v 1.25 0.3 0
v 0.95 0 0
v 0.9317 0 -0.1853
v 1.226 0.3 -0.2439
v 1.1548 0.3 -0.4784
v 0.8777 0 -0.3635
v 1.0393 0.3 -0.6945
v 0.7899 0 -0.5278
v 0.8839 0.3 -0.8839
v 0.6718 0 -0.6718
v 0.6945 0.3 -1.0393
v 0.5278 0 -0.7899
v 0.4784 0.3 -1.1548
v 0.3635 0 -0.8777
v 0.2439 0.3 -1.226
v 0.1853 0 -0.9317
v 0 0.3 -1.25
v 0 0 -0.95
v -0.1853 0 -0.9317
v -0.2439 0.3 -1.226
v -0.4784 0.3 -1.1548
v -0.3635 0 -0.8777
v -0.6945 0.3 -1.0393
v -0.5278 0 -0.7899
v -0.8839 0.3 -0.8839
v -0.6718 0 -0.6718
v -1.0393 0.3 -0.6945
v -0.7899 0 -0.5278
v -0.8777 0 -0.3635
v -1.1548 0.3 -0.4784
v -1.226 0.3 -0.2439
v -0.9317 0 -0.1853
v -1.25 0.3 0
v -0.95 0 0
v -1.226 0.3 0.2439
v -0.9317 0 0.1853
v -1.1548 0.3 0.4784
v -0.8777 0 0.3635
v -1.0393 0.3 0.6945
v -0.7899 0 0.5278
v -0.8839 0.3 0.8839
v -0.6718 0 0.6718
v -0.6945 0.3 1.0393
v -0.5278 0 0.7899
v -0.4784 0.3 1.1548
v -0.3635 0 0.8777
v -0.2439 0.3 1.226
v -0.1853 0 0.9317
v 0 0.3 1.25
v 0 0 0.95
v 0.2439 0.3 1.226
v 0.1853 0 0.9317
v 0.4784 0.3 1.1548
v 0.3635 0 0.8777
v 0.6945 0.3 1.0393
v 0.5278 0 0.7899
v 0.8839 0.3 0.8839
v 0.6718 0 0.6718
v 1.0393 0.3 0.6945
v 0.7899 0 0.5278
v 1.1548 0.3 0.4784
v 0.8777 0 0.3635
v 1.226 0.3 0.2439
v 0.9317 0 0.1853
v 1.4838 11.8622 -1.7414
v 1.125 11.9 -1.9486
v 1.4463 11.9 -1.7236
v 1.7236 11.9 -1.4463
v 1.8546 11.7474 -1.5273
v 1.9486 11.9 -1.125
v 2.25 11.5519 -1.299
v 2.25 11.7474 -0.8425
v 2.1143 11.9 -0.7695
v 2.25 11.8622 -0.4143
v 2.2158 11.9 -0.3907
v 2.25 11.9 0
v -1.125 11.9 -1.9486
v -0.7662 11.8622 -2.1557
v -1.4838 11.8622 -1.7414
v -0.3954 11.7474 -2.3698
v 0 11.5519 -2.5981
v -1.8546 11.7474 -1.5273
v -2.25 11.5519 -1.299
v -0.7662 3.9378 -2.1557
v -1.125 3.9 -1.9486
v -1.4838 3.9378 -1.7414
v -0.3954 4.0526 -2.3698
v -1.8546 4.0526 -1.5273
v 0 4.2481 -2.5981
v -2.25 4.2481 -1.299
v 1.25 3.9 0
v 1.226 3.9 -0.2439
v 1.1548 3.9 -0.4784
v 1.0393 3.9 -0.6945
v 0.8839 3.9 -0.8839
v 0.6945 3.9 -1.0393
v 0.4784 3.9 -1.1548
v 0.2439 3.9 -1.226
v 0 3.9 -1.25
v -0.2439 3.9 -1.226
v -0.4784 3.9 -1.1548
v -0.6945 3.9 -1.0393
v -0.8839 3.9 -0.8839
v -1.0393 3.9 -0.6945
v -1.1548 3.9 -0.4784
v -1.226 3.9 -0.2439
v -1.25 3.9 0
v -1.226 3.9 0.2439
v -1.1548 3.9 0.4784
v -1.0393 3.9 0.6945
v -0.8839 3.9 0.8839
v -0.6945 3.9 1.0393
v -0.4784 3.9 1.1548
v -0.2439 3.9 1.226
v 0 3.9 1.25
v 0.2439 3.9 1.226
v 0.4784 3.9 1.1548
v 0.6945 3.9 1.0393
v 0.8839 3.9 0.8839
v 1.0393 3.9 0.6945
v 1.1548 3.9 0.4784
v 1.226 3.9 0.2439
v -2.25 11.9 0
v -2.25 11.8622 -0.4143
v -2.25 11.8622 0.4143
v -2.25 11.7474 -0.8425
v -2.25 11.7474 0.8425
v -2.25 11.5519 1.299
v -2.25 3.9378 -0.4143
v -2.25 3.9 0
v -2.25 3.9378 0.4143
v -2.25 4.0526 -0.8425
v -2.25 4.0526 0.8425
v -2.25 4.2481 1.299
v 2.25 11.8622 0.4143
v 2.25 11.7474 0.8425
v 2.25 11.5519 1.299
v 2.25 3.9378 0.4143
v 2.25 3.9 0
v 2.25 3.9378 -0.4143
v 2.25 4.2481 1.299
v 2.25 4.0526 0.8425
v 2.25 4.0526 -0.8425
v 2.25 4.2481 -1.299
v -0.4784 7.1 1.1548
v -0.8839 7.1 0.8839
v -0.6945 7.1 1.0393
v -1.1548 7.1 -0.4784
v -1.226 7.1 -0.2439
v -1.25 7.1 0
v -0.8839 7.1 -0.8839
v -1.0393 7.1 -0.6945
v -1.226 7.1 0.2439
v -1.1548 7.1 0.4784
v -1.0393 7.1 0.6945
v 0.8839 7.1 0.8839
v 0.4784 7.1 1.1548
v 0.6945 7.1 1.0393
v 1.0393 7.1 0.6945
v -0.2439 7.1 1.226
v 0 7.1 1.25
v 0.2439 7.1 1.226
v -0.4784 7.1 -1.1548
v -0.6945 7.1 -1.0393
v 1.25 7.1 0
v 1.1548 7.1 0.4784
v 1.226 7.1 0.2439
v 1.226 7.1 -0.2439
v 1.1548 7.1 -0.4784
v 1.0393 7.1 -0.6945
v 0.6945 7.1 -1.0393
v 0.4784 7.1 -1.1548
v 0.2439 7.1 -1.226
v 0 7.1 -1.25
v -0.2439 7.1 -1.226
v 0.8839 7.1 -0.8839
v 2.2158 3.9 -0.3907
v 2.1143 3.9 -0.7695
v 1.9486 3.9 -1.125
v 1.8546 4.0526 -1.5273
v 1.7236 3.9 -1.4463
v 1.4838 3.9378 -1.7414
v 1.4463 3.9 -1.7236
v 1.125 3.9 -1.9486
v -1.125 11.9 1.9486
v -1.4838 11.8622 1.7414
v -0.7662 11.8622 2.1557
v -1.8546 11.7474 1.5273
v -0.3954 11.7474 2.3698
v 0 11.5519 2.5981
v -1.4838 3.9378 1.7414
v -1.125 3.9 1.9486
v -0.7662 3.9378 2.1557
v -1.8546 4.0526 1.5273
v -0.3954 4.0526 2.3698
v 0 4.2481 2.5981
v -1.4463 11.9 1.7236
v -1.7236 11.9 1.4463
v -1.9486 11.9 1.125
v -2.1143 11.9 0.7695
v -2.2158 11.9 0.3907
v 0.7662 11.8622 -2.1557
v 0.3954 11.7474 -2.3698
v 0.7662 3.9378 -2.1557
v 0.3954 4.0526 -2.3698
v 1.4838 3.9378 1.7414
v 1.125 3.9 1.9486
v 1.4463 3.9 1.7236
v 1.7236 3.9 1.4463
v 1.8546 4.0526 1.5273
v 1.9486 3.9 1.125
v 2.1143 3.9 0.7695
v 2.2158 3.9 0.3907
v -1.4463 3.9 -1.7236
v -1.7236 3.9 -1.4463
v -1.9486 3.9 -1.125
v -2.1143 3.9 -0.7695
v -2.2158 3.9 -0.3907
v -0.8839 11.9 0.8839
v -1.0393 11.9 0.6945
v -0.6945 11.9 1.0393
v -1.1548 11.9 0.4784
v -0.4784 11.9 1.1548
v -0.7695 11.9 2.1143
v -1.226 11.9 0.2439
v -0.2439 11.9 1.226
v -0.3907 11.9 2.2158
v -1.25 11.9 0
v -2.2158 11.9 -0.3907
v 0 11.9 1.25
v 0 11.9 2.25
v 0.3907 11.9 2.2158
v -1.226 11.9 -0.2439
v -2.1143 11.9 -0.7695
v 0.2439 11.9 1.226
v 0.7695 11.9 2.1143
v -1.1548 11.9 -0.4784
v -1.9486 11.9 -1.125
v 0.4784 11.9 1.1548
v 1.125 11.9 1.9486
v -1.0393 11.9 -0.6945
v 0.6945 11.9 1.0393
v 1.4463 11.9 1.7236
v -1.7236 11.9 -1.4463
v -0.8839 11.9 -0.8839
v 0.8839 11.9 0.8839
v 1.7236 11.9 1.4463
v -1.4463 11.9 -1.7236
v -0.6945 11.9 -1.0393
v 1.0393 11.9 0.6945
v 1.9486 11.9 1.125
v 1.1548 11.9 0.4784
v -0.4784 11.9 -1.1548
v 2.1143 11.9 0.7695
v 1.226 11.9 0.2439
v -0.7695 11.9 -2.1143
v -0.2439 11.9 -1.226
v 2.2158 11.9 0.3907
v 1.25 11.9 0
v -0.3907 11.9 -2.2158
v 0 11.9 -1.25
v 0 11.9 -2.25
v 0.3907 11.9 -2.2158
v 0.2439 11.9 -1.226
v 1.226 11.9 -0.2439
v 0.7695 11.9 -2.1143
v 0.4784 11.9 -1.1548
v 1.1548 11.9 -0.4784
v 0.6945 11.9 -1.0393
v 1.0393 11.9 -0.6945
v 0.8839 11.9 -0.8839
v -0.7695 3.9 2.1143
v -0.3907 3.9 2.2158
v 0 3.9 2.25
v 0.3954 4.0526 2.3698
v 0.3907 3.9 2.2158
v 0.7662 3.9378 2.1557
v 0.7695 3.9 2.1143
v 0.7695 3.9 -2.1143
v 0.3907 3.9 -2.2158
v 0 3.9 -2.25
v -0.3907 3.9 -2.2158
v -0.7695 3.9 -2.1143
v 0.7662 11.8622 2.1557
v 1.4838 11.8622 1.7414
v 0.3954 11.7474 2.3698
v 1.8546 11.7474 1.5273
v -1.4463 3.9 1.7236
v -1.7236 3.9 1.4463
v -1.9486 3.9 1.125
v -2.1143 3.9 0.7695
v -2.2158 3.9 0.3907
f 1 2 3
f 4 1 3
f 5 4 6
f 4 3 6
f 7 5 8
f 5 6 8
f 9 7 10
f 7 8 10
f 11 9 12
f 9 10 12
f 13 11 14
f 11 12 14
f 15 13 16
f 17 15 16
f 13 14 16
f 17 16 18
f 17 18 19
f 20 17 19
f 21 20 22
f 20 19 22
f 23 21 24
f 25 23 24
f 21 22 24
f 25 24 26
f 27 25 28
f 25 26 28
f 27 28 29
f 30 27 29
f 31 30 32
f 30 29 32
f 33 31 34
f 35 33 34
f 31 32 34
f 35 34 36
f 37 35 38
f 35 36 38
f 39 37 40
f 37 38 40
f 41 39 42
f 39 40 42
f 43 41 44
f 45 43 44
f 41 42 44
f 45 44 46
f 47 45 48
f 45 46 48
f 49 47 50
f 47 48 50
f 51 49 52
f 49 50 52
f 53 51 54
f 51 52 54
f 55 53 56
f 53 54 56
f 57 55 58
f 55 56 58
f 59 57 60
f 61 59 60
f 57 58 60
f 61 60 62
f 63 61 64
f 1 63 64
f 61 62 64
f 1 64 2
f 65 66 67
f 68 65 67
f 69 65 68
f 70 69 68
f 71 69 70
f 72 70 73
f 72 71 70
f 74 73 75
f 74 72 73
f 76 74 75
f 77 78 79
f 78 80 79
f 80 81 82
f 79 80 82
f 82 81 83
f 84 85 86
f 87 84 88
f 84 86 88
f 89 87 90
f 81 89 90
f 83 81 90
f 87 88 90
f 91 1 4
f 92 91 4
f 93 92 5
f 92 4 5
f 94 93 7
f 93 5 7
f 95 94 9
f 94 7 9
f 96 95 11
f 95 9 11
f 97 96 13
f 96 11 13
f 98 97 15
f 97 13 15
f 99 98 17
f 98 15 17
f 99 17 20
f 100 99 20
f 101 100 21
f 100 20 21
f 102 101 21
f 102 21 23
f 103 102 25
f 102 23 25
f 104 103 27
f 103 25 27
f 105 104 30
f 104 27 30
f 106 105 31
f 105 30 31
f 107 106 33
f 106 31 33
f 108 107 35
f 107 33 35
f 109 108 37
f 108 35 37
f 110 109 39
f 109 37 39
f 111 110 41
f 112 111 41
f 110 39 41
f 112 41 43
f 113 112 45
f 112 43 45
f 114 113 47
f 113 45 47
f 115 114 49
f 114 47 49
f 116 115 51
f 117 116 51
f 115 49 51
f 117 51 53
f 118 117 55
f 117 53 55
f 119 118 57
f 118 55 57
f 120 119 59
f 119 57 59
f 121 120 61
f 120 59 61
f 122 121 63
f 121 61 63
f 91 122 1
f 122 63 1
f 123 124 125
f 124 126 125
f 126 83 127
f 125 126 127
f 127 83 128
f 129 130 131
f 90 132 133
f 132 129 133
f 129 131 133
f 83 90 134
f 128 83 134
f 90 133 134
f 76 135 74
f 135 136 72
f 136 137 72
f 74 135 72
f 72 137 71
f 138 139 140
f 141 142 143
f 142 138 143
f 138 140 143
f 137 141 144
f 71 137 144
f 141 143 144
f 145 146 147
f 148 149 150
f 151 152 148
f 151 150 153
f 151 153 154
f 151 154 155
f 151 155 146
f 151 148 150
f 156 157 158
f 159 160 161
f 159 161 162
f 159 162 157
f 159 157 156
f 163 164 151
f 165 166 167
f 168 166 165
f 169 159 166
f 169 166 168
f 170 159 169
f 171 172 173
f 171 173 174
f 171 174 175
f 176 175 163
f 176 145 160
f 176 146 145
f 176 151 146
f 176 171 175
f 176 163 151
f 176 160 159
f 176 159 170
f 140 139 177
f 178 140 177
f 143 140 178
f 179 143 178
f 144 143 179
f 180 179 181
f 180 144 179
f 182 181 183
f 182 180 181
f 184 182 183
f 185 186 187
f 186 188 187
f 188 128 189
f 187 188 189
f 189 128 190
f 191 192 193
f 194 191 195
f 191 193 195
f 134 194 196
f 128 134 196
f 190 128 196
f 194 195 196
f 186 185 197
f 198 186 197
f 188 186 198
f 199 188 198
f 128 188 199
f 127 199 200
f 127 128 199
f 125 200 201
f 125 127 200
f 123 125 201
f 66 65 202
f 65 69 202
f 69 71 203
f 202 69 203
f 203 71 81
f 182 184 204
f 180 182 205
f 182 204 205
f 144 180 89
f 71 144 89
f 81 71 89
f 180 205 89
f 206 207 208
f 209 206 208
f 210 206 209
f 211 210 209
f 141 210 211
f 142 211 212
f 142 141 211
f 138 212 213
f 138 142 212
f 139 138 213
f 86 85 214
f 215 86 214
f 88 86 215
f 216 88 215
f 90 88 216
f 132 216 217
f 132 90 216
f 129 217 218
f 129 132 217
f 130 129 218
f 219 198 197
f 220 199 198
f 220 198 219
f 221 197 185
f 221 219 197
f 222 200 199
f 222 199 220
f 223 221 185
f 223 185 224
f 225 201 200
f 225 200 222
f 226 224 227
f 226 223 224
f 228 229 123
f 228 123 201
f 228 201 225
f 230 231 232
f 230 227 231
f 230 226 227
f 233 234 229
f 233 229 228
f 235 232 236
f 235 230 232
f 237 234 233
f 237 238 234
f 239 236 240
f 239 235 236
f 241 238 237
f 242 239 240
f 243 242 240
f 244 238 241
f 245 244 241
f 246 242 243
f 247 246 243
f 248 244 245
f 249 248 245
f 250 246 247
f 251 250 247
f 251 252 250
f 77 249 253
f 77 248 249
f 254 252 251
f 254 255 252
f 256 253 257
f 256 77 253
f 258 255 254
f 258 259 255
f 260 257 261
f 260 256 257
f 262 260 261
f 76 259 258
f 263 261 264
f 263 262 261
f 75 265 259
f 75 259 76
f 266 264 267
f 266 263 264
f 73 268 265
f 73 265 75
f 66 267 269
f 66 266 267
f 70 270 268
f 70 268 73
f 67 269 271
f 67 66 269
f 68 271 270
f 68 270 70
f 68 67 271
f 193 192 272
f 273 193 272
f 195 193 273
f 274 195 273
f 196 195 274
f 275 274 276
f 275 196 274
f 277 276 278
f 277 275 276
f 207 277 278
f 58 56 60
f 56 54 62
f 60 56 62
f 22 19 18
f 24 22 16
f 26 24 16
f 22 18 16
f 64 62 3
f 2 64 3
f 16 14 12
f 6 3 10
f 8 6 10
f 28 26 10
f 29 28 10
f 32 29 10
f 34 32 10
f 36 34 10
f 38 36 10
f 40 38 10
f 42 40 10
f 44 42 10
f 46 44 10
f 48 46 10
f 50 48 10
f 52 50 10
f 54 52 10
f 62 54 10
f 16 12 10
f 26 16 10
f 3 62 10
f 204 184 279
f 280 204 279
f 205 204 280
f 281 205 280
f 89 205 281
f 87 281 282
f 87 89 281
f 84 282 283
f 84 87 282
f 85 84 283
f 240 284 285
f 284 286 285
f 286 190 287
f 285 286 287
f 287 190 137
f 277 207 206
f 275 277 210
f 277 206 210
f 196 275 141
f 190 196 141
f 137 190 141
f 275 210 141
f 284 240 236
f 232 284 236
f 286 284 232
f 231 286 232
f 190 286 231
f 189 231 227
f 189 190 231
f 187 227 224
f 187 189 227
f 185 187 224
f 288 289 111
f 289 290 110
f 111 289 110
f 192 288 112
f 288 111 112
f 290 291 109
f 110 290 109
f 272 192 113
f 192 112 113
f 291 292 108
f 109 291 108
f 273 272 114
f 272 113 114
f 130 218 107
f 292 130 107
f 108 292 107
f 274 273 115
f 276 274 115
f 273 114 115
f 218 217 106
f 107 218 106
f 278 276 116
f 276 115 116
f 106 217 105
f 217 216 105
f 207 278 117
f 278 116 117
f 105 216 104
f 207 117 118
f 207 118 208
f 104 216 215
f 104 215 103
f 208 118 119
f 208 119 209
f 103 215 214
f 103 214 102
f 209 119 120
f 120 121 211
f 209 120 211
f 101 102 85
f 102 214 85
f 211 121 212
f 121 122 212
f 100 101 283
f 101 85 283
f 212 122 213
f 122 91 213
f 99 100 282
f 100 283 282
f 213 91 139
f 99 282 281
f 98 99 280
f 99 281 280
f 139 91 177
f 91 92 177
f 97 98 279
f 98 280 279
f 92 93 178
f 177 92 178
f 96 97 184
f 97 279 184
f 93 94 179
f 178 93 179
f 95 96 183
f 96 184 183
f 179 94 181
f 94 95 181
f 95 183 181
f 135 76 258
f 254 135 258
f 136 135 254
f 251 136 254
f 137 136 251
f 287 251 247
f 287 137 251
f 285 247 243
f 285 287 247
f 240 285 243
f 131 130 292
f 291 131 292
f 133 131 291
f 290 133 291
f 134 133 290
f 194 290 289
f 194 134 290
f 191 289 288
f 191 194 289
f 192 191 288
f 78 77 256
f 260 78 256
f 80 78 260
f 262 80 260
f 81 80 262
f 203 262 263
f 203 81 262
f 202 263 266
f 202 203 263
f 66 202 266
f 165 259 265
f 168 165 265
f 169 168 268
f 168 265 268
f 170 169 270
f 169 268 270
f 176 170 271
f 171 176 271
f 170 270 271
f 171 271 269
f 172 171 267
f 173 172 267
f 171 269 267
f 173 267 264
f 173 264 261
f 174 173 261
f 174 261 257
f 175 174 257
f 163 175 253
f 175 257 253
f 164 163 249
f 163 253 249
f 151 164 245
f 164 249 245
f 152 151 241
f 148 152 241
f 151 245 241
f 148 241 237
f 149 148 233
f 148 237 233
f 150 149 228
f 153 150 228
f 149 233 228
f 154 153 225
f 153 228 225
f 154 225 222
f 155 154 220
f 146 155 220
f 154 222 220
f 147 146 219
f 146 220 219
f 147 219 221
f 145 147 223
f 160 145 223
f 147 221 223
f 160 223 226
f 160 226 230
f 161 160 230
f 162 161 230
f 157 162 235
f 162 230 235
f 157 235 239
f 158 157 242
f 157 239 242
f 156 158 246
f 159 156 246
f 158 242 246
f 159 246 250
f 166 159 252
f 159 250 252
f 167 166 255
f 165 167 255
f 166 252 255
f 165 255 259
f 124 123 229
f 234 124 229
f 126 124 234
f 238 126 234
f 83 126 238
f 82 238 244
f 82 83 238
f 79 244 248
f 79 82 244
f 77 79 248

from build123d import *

# Parameters (mm, degrees)
SKETCH1_R           = 1.25
BOSS_EXTRUDE1_DEPTH = 3.9
BOSS_EXTRUDE2_DEPTH = 8
SKETCH3_R           = 1.25
CUT_EXTRUDE1_DEPTH  = 4.8
SKETCH4_OUTSIDE_W   = 35.048
SKETCH4_OUTSIDE_H   = 35.744
SKETCH4_OUTSIDE_R   = 2.25
CUT_EXTRUDE2_DEPTH  = 12.9
CUT_EXTRUDE2_TAPER  = 45
SKETCH5_OUTSIDE_W   = 27.248
SKETCH5_OUTSIDE_H   = 27.944
SKETCH5_OUTSIDE_R   = 2.25
CUT_EXTRUDE3_DEPTH  = 9
CUT_EXTRUDE3_TAPER  = 45
CHAMFER1_SIZE       = 0.3


with BuildPart() as part:
    # Sketch1 → Boss-Extrude1 (new body)
    with BuildSketch(Plane(origin=(0, 0, 0), x_dir=(1, 0, 0), z_dir=(0, 1, 0))):
        Circle(SKETCH1_R)
    extrude(amount=BOSS_EXTRUDE1_DEPTH)

    # Sketch2 → Boss-Extrude2 (add)
    with BuildSketch(Plane(origin=(0, 3.9, 0), x_dir=(1, 0, 0), z_dir=(0, 1, 0))):
        Polygon((0, -2.598076211), (2.25, -1.299038106), (2.25, 1.299038106), (0, 2.598076211), (-2.25, 1.299038106), (-2.25, -1.299038106), align=None)
    extrude(amount=BOSS_EXTRUDE2_DEPTH)

    # Sketch3 → Cut-Extrude1 (cut)
    with BuildSketch(Plane(origin=(0, 11.9, 0), x_dir=(1, 0, 0), z_dir=(0, 1, 0))):
        Circle(SKETCH3_R)
    extrude(amount=-CUT_EXTRUDE1_DEPTH, mode=Mode.SUBTRACT)

    # Sketch4 outside → Cut-Extrude2 (cut, through all)
    with BuildSketch(Plane(origin=(0, 11.9, 0), x_dir=(1, 0, 0), z_dir=(0, 1, 0))):
        Rectangle(SKETCH4_OUTSIDE_W, SKETCH4_OUTSIDE_H)
        Circle(SKETCH4_OUTSIDE_R, mode=Mode.SUBTRACT)
    extrude(amount=-CUT_EXTRUDE2_DEPTH, taper=CUT_EXTRUDE2_TAPER, mode=Mode.SUBTRACT)

    # Sketch5 outside → Cut-Extrude3 (cut, through all)
    with BuildSketch(Plane.XZ.offset(-3.9)):
        Rectangle(SKETCH5_OUTSIDE_W, SKETCH5_OUTSIDE_H)
        Circle(SKETCH5_OUTSIDE_R, mode=Mode.SUBTRACT)
    extrude(amount=-CUT_EXTRUDE3_DEPTH, taper=CUT_EXTRUDE3_TAPER, mode=Mode.SUBTRACT)

    # Chamfer1
    chamfer1_edges = [part.edges().sort_by_distance(p)[0] for p in [
        (-1.25, 0, 0),
    ]]
    chamfer(chamfer1_edges, length=CHAMFER1_SIZE)


solid = part.part
